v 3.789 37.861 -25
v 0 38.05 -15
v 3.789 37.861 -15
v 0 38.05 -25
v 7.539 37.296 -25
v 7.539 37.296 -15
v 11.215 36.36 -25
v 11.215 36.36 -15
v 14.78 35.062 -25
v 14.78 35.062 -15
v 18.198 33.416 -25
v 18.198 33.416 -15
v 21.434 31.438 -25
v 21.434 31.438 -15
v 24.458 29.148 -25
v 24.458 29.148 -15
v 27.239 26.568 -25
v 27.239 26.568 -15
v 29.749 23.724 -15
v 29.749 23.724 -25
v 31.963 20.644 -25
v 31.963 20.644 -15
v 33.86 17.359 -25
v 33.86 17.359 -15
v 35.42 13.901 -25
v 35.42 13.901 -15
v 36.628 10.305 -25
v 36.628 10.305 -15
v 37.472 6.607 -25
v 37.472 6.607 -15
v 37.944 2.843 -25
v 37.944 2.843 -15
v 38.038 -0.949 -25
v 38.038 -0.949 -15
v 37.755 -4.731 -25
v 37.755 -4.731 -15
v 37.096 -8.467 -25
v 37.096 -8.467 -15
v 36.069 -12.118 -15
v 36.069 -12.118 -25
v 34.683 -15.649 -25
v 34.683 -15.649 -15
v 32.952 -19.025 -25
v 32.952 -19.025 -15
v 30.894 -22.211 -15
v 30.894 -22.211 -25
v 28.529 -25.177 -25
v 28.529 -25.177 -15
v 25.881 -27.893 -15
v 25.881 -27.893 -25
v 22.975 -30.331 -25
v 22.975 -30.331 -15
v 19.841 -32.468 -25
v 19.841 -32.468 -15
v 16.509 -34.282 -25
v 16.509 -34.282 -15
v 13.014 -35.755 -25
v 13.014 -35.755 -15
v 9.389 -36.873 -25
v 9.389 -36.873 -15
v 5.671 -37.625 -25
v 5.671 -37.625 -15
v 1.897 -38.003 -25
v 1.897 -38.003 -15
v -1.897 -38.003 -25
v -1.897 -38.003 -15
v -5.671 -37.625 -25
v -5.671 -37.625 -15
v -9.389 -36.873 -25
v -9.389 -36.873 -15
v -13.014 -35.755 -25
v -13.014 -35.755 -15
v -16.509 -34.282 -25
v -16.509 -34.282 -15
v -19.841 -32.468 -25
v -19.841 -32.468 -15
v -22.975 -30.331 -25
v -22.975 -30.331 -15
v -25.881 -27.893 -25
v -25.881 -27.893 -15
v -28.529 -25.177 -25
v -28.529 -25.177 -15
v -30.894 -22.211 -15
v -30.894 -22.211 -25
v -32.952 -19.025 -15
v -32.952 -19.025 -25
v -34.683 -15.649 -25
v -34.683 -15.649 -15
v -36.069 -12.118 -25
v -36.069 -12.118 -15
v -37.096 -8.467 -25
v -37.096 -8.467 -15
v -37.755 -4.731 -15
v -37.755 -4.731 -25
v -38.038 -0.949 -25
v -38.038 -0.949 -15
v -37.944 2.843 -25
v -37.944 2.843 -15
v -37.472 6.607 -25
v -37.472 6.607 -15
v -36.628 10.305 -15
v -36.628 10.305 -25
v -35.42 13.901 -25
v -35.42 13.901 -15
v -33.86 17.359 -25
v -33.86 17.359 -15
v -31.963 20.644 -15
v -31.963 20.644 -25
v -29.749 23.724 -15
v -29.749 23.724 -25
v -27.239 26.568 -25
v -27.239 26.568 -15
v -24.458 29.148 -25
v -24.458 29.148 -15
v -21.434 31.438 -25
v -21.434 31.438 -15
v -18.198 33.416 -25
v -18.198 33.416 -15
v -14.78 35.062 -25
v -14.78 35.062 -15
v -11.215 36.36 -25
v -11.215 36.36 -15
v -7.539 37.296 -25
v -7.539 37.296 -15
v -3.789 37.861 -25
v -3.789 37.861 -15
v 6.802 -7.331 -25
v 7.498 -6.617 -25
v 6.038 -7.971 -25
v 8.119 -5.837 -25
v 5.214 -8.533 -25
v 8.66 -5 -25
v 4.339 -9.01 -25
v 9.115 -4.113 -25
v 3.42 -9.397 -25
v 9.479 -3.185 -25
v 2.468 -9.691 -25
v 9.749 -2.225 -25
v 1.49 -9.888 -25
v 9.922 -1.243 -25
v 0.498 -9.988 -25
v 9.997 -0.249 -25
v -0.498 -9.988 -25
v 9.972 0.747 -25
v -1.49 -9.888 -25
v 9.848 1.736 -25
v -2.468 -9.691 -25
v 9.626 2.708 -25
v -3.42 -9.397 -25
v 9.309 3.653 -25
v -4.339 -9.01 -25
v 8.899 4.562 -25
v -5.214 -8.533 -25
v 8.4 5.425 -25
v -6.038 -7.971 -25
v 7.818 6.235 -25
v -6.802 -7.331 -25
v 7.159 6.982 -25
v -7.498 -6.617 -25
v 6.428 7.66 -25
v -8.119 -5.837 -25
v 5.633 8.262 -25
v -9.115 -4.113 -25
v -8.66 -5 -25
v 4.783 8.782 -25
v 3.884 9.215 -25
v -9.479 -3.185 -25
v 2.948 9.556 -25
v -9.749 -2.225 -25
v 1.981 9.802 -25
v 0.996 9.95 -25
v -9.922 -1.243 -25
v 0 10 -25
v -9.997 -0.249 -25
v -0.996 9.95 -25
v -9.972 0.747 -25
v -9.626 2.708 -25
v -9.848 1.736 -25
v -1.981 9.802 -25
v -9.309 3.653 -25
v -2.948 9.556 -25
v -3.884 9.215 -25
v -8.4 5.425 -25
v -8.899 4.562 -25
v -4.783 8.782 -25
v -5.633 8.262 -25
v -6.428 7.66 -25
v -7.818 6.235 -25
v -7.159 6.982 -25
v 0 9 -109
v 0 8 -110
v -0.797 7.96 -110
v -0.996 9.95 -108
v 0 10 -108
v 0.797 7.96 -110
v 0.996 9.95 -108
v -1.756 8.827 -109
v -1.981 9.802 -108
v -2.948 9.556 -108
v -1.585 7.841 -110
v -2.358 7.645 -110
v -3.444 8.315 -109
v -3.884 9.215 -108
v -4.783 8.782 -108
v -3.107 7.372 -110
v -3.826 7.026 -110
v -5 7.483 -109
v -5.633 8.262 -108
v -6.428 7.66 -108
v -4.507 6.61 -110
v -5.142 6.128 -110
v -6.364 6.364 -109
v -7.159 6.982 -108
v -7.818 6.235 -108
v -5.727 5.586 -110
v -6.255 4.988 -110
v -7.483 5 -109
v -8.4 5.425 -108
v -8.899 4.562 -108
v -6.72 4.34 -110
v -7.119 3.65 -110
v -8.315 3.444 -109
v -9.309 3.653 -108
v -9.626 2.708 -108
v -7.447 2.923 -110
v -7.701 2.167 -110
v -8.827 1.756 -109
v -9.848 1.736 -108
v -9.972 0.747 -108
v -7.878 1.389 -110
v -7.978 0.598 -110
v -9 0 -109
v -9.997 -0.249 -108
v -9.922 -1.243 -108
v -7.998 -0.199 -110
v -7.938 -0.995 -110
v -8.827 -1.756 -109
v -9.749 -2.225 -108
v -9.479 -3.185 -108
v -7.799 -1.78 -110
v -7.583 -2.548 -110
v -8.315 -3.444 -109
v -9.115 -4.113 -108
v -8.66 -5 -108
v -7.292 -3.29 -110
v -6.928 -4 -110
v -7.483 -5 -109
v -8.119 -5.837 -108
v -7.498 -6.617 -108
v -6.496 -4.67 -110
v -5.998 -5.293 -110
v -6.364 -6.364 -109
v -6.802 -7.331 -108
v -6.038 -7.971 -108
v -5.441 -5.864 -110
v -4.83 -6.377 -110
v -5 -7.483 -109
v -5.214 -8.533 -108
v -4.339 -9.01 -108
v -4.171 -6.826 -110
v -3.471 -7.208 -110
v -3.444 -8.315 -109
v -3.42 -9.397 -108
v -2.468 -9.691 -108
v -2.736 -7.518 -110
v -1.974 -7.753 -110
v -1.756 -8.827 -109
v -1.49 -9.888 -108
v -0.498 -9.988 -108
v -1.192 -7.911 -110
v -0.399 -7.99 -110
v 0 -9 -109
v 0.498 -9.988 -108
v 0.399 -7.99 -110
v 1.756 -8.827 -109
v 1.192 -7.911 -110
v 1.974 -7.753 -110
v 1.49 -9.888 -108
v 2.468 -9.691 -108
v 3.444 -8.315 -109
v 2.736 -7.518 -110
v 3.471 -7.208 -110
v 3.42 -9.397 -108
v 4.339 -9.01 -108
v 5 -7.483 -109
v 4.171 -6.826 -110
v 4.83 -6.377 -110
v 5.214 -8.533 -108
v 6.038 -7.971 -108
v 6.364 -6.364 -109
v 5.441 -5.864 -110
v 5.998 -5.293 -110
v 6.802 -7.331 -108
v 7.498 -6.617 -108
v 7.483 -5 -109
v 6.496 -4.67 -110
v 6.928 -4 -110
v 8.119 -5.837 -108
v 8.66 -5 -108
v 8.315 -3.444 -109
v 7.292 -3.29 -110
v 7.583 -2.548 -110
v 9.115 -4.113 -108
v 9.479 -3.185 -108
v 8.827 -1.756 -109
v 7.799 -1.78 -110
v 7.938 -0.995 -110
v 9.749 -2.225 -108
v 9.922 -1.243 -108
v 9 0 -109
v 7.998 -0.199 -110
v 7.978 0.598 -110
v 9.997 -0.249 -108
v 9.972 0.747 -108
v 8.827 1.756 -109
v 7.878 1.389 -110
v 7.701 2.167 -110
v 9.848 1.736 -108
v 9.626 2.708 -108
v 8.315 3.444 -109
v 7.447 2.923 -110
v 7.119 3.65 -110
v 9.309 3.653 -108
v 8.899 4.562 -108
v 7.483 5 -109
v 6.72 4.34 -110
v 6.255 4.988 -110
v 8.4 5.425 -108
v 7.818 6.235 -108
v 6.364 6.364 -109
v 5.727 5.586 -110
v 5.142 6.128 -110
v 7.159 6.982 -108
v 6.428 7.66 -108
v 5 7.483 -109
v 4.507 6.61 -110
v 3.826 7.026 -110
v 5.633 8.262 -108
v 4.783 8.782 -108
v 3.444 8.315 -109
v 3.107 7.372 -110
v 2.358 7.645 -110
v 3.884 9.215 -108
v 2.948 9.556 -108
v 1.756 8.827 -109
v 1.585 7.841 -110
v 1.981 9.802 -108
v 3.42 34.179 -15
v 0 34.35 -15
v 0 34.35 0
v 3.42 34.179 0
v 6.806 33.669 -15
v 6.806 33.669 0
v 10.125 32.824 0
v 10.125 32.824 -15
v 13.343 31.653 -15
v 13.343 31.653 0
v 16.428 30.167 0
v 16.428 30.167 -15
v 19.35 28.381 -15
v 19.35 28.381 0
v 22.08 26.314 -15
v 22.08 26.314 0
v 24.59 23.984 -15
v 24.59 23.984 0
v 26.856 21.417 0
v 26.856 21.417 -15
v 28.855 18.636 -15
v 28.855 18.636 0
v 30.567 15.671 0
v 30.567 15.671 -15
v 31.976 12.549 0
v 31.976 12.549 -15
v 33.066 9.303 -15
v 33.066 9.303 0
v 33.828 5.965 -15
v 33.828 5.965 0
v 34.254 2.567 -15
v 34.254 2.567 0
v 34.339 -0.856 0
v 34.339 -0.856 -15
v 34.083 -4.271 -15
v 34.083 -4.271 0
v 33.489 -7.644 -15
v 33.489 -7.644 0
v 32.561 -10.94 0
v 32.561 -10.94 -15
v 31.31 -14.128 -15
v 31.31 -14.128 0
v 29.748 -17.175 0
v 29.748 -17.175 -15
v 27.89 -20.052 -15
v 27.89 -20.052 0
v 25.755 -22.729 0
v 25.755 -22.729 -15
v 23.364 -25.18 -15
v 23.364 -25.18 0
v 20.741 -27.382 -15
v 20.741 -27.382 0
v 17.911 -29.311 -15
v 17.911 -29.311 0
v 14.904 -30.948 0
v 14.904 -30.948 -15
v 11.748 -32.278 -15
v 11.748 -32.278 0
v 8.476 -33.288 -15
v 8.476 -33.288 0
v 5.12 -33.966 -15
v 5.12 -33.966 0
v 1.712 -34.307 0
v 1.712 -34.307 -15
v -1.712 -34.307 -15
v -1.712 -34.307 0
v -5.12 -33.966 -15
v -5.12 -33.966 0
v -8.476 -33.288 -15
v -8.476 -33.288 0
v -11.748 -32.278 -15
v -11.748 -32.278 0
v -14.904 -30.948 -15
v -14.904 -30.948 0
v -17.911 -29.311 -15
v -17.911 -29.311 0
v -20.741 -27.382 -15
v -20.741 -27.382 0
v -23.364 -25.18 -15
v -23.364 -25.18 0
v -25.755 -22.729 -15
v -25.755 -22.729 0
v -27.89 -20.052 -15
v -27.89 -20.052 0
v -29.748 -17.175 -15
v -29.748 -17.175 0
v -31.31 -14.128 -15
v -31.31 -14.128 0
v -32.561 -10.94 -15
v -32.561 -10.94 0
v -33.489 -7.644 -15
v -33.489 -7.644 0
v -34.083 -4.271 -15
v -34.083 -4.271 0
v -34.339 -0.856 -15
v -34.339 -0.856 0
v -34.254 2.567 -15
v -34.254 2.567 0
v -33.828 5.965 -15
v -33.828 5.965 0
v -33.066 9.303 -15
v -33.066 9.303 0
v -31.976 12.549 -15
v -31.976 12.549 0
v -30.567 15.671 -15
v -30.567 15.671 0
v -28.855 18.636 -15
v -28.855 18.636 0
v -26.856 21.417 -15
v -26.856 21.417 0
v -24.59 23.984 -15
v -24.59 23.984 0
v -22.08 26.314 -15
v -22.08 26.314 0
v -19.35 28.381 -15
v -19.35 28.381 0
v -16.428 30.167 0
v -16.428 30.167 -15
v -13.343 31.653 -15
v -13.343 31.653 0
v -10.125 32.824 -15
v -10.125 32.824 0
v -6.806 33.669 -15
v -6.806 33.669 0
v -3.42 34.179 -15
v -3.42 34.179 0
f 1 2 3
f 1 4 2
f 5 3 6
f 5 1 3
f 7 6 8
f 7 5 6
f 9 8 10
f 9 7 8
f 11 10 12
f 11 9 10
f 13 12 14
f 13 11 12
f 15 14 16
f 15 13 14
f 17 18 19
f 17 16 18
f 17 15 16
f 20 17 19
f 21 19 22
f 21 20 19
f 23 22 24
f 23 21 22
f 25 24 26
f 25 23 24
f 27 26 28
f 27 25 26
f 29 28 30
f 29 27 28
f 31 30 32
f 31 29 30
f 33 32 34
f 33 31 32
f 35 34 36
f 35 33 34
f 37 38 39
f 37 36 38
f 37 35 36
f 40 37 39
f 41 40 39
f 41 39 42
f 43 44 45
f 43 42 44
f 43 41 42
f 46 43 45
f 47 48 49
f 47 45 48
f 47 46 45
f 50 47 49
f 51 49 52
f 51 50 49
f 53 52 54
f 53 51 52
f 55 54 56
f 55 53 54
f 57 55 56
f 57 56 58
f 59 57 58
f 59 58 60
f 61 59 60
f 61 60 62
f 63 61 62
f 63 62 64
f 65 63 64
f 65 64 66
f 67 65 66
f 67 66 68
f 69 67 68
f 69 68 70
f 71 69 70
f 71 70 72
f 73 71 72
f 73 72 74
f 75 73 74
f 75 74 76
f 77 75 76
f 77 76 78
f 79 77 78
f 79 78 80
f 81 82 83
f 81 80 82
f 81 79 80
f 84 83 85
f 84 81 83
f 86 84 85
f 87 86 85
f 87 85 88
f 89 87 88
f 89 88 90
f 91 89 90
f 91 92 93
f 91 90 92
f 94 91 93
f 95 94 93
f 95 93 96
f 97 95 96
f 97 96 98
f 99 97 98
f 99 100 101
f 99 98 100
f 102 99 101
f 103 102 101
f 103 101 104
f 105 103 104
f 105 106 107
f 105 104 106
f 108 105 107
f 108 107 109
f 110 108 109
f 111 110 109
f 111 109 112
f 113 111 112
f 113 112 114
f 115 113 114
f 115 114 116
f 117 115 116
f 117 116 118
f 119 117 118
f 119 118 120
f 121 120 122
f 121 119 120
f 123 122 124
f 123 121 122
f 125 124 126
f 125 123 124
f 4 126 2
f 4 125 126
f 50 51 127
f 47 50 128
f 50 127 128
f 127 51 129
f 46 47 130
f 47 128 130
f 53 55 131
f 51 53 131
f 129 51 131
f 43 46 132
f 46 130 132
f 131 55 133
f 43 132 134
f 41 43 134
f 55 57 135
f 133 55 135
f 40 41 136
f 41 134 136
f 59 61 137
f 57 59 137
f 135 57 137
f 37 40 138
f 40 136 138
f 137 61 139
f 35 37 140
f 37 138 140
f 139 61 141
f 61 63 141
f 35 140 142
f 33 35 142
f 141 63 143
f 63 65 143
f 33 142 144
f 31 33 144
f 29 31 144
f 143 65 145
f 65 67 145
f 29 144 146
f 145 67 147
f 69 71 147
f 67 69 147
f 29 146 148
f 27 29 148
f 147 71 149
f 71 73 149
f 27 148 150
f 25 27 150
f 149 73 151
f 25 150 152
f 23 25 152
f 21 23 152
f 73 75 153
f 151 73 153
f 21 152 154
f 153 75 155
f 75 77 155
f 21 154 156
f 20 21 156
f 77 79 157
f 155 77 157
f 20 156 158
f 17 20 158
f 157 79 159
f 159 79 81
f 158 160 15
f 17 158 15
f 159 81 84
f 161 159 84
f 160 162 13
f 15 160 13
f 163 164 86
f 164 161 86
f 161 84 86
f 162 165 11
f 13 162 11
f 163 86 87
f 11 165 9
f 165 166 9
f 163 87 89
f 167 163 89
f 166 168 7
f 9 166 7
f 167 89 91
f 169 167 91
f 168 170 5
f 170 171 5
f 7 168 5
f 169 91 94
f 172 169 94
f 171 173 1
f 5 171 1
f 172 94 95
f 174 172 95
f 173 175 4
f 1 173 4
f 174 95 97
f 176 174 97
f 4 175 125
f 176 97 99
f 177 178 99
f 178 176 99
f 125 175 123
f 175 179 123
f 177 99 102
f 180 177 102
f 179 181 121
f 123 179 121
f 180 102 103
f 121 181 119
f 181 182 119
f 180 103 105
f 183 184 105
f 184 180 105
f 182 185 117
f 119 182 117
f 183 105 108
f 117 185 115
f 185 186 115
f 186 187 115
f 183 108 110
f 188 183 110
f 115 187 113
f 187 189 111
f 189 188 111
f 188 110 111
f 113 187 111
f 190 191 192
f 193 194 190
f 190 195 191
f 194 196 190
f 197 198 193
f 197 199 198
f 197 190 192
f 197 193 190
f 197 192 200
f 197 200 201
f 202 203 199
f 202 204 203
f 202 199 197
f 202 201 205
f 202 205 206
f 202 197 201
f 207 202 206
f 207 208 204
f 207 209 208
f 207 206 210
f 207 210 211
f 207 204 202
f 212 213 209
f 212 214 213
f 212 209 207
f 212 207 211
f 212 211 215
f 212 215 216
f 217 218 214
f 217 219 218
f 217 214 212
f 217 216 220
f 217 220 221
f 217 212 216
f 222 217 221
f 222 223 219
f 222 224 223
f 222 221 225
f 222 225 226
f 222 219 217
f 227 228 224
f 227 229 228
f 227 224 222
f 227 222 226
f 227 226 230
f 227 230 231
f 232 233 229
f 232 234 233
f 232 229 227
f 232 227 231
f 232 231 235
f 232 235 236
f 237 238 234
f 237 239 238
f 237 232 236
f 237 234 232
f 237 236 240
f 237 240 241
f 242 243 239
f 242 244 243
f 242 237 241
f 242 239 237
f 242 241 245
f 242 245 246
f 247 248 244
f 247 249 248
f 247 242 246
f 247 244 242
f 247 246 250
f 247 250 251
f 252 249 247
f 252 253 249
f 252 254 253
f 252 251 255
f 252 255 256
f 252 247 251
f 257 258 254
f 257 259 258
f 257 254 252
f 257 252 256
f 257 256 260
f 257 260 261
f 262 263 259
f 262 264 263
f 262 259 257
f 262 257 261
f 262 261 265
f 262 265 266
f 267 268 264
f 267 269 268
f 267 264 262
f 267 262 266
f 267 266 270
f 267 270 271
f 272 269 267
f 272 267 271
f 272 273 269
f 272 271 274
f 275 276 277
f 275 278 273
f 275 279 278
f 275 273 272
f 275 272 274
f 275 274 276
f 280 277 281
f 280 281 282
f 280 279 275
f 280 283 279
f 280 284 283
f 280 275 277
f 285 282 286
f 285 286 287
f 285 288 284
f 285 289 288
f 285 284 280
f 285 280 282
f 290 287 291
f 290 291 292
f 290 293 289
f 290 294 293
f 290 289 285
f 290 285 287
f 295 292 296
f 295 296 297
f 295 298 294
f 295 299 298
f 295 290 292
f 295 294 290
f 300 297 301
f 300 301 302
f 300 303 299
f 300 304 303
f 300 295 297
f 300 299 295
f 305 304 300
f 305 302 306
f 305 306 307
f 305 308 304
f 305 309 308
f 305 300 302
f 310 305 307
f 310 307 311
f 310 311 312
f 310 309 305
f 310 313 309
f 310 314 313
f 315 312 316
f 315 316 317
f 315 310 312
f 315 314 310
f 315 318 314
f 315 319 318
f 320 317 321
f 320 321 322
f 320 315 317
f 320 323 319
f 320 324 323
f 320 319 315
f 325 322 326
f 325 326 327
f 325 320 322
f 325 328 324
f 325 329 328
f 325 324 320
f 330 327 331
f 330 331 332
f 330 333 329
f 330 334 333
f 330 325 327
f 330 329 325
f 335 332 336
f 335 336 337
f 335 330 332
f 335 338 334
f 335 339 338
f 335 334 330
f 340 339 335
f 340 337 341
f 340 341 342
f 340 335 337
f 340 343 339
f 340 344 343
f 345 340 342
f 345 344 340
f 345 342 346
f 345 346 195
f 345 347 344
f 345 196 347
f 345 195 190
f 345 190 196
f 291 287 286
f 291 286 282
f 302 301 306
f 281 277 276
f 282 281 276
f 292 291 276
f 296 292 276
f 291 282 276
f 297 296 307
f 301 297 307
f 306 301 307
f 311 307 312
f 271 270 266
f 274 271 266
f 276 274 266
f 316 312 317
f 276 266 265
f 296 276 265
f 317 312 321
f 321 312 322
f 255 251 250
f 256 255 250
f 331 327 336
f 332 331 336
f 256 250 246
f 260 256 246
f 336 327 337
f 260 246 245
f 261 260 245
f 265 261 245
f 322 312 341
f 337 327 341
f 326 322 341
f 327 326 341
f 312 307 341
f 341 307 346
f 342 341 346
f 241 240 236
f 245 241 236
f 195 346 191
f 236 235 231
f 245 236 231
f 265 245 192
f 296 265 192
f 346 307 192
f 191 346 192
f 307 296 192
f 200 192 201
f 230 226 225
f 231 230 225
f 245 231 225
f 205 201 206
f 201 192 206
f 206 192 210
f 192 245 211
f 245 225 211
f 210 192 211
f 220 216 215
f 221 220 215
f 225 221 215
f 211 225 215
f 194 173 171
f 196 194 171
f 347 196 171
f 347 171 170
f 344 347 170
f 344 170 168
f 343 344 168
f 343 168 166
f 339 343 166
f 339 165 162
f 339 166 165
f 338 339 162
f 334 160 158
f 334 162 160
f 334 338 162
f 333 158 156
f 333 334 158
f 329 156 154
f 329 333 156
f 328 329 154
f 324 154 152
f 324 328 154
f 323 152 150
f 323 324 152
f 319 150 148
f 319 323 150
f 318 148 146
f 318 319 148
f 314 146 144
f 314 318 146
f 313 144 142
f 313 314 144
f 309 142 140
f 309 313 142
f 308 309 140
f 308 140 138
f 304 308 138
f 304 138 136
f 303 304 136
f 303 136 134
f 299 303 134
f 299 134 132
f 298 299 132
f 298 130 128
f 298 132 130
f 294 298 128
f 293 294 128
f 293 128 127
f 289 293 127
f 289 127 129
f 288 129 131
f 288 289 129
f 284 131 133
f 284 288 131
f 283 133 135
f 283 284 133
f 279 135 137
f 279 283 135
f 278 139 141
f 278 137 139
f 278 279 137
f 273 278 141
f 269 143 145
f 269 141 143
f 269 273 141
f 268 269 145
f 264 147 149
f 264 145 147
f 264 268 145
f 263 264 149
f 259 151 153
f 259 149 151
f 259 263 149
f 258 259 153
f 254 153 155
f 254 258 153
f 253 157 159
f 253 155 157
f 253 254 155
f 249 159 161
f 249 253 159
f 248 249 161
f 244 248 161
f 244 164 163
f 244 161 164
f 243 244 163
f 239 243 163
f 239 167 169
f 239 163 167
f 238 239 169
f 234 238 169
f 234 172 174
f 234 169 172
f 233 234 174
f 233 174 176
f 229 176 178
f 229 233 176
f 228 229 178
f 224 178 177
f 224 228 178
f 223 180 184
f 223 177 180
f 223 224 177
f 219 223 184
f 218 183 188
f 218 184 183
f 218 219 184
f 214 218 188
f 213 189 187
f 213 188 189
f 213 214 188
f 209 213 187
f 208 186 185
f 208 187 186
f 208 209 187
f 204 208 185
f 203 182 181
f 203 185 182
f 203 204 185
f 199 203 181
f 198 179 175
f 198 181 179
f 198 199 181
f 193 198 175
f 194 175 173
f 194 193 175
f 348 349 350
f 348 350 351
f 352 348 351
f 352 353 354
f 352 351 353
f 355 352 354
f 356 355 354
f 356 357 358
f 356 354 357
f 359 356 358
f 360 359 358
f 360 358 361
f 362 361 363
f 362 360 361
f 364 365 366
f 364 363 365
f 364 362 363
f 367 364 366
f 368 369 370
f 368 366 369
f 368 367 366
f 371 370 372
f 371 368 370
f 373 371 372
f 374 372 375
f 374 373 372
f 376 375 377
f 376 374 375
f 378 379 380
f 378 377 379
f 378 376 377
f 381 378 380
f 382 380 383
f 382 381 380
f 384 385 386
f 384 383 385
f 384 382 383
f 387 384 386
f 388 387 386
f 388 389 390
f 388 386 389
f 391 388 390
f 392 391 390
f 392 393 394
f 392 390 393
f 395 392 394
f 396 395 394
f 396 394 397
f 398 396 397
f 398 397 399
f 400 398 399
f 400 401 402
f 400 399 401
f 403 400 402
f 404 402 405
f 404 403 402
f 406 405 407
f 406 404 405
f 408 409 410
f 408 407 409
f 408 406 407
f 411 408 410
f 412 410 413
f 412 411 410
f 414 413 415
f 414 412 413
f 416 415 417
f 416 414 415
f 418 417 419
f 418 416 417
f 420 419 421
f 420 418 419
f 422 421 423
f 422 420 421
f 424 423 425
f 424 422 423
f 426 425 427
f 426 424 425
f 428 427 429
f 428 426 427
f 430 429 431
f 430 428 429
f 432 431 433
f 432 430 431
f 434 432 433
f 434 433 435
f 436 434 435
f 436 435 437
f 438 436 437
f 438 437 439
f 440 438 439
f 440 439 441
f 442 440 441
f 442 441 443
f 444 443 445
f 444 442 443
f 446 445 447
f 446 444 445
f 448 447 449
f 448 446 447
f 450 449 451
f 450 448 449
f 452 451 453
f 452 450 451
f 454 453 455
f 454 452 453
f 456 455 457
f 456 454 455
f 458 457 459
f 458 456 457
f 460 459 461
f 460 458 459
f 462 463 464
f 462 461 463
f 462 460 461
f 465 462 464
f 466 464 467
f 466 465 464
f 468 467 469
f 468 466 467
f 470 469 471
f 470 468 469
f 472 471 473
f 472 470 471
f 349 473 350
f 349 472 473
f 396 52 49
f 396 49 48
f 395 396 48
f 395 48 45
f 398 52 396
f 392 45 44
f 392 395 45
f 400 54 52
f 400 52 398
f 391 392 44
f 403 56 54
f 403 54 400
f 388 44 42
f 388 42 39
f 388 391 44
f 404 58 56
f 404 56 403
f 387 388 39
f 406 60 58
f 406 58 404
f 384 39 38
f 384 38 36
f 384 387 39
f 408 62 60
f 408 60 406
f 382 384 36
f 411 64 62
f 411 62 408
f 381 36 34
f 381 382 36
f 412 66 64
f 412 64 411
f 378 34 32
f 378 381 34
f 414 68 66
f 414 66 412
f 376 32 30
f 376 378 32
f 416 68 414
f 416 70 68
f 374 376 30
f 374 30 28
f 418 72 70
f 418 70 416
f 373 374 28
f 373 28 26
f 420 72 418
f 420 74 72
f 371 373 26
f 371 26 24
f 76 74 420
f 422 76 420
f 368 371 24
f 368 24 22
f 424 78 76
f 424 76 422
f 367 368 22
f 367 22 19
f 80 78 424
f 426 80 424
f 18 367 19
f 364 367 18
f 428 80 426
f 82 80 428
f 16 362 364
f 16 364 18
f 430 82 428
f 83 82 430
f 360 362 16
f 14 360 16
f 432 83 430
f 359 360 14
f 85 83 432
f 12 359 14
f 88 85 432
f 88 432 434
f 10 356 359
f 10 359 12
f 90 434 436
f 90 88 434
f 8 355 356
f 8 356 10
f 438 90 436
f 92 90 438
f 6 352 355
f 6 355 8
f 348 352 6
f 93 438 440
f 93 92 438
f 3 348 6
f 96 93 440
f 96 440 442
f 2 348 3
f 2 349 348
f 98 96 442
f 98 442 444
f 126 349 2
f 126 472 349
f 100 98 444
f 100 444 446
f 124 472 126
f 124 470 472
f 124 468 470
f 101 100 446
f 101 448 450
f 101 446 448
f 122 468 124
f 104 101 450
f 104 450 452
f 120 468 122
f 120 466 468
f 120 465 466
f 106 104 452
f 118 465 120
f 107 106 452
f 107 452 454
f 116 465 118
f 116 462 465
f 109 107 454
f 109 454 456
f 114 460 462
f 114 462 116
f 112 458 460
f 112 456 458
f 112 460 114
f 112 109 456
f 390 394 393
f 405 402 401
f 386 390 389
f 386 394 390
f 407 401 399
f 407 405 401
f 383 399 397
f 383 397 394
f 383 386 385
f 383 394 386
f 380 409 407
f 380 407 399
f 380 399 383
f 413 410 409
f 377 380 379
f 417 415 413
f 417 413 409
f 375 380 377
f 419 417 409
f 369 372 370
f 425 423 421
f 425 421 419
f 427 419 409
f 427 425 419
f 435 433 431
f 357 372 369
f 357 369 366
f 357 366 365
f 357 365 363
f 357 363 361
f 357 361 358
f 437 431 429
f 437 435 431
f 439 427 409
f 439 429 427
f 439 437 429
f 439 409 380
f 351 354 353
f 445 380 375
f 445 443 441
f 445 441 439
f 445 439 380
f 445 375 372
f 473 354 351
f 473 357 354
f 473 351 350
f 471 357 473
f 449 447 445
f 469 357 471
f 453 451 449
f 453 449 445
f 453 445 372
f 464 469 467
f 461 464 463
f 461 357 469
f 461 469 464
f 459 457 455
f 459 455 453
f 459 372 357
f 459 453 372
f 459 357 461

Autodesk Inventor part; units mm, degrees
ref_plane "YZ Plane" through (0, 0, 0) normal (1, 0, 0) x (0, 1, 0)
ref_plane "XZ Plane" through (0, 0, 0) normal (0, 1, 0) x (-1, 0, 0)
ref_plane "XY Plane" through (0, 0, 0) normal (0, 0, 1) x (1, 0, 0)
sketch "Skizze1" plane through (0, 0, 0) normal (1, 0, 0) x (0, 1, 0)
  line L0 (0, -29.1045) -> (0, 0)
  line L1 (0, 0) -> (0, -20.5338)
  line L2 (0, 0) -> (34.35, 0)
  line L3 (34.35, 0) -> (34.35, -15)
  line L4 (34.35, -15) -> (38.05, -15)
  line L5 (38.05, -15) -> (38.05, -25)
  line L6 (38.05, -25) -> (10, -25)
  line L7 (10, -25) -> (10, -110)
  line L8 (10, -110) -> (0, -110)
  line L9 (0, 0) -> (0, -24.283)
  line L10 (34.35, 0) -> (0, 0)
  line L11 (0, -132) -> (0, 22) projected
  line L12 (0, -110) -> (0, 0)
  dimension "d0" = 15
  dimension "d1" = 25
  dimension "d2" = 76.1
  dimension "d3" = 68.7
  dimension "d4" = 20
  dimension "d6" = 85
revolve "Umdrehung1" add sketch "Skizze1" angle 360 about axis through (0, 0, -110) along (0, 0, 1)
thread "Gewinde1" size "M20x2.5" class "6g" standard "ANSI Metric M Profile" length 25
chamfer "Fase1" distance 2 angle 45 1 edges at (0, -10, -110)
properties part number "Rad Aufnahme" material "Stahl"
